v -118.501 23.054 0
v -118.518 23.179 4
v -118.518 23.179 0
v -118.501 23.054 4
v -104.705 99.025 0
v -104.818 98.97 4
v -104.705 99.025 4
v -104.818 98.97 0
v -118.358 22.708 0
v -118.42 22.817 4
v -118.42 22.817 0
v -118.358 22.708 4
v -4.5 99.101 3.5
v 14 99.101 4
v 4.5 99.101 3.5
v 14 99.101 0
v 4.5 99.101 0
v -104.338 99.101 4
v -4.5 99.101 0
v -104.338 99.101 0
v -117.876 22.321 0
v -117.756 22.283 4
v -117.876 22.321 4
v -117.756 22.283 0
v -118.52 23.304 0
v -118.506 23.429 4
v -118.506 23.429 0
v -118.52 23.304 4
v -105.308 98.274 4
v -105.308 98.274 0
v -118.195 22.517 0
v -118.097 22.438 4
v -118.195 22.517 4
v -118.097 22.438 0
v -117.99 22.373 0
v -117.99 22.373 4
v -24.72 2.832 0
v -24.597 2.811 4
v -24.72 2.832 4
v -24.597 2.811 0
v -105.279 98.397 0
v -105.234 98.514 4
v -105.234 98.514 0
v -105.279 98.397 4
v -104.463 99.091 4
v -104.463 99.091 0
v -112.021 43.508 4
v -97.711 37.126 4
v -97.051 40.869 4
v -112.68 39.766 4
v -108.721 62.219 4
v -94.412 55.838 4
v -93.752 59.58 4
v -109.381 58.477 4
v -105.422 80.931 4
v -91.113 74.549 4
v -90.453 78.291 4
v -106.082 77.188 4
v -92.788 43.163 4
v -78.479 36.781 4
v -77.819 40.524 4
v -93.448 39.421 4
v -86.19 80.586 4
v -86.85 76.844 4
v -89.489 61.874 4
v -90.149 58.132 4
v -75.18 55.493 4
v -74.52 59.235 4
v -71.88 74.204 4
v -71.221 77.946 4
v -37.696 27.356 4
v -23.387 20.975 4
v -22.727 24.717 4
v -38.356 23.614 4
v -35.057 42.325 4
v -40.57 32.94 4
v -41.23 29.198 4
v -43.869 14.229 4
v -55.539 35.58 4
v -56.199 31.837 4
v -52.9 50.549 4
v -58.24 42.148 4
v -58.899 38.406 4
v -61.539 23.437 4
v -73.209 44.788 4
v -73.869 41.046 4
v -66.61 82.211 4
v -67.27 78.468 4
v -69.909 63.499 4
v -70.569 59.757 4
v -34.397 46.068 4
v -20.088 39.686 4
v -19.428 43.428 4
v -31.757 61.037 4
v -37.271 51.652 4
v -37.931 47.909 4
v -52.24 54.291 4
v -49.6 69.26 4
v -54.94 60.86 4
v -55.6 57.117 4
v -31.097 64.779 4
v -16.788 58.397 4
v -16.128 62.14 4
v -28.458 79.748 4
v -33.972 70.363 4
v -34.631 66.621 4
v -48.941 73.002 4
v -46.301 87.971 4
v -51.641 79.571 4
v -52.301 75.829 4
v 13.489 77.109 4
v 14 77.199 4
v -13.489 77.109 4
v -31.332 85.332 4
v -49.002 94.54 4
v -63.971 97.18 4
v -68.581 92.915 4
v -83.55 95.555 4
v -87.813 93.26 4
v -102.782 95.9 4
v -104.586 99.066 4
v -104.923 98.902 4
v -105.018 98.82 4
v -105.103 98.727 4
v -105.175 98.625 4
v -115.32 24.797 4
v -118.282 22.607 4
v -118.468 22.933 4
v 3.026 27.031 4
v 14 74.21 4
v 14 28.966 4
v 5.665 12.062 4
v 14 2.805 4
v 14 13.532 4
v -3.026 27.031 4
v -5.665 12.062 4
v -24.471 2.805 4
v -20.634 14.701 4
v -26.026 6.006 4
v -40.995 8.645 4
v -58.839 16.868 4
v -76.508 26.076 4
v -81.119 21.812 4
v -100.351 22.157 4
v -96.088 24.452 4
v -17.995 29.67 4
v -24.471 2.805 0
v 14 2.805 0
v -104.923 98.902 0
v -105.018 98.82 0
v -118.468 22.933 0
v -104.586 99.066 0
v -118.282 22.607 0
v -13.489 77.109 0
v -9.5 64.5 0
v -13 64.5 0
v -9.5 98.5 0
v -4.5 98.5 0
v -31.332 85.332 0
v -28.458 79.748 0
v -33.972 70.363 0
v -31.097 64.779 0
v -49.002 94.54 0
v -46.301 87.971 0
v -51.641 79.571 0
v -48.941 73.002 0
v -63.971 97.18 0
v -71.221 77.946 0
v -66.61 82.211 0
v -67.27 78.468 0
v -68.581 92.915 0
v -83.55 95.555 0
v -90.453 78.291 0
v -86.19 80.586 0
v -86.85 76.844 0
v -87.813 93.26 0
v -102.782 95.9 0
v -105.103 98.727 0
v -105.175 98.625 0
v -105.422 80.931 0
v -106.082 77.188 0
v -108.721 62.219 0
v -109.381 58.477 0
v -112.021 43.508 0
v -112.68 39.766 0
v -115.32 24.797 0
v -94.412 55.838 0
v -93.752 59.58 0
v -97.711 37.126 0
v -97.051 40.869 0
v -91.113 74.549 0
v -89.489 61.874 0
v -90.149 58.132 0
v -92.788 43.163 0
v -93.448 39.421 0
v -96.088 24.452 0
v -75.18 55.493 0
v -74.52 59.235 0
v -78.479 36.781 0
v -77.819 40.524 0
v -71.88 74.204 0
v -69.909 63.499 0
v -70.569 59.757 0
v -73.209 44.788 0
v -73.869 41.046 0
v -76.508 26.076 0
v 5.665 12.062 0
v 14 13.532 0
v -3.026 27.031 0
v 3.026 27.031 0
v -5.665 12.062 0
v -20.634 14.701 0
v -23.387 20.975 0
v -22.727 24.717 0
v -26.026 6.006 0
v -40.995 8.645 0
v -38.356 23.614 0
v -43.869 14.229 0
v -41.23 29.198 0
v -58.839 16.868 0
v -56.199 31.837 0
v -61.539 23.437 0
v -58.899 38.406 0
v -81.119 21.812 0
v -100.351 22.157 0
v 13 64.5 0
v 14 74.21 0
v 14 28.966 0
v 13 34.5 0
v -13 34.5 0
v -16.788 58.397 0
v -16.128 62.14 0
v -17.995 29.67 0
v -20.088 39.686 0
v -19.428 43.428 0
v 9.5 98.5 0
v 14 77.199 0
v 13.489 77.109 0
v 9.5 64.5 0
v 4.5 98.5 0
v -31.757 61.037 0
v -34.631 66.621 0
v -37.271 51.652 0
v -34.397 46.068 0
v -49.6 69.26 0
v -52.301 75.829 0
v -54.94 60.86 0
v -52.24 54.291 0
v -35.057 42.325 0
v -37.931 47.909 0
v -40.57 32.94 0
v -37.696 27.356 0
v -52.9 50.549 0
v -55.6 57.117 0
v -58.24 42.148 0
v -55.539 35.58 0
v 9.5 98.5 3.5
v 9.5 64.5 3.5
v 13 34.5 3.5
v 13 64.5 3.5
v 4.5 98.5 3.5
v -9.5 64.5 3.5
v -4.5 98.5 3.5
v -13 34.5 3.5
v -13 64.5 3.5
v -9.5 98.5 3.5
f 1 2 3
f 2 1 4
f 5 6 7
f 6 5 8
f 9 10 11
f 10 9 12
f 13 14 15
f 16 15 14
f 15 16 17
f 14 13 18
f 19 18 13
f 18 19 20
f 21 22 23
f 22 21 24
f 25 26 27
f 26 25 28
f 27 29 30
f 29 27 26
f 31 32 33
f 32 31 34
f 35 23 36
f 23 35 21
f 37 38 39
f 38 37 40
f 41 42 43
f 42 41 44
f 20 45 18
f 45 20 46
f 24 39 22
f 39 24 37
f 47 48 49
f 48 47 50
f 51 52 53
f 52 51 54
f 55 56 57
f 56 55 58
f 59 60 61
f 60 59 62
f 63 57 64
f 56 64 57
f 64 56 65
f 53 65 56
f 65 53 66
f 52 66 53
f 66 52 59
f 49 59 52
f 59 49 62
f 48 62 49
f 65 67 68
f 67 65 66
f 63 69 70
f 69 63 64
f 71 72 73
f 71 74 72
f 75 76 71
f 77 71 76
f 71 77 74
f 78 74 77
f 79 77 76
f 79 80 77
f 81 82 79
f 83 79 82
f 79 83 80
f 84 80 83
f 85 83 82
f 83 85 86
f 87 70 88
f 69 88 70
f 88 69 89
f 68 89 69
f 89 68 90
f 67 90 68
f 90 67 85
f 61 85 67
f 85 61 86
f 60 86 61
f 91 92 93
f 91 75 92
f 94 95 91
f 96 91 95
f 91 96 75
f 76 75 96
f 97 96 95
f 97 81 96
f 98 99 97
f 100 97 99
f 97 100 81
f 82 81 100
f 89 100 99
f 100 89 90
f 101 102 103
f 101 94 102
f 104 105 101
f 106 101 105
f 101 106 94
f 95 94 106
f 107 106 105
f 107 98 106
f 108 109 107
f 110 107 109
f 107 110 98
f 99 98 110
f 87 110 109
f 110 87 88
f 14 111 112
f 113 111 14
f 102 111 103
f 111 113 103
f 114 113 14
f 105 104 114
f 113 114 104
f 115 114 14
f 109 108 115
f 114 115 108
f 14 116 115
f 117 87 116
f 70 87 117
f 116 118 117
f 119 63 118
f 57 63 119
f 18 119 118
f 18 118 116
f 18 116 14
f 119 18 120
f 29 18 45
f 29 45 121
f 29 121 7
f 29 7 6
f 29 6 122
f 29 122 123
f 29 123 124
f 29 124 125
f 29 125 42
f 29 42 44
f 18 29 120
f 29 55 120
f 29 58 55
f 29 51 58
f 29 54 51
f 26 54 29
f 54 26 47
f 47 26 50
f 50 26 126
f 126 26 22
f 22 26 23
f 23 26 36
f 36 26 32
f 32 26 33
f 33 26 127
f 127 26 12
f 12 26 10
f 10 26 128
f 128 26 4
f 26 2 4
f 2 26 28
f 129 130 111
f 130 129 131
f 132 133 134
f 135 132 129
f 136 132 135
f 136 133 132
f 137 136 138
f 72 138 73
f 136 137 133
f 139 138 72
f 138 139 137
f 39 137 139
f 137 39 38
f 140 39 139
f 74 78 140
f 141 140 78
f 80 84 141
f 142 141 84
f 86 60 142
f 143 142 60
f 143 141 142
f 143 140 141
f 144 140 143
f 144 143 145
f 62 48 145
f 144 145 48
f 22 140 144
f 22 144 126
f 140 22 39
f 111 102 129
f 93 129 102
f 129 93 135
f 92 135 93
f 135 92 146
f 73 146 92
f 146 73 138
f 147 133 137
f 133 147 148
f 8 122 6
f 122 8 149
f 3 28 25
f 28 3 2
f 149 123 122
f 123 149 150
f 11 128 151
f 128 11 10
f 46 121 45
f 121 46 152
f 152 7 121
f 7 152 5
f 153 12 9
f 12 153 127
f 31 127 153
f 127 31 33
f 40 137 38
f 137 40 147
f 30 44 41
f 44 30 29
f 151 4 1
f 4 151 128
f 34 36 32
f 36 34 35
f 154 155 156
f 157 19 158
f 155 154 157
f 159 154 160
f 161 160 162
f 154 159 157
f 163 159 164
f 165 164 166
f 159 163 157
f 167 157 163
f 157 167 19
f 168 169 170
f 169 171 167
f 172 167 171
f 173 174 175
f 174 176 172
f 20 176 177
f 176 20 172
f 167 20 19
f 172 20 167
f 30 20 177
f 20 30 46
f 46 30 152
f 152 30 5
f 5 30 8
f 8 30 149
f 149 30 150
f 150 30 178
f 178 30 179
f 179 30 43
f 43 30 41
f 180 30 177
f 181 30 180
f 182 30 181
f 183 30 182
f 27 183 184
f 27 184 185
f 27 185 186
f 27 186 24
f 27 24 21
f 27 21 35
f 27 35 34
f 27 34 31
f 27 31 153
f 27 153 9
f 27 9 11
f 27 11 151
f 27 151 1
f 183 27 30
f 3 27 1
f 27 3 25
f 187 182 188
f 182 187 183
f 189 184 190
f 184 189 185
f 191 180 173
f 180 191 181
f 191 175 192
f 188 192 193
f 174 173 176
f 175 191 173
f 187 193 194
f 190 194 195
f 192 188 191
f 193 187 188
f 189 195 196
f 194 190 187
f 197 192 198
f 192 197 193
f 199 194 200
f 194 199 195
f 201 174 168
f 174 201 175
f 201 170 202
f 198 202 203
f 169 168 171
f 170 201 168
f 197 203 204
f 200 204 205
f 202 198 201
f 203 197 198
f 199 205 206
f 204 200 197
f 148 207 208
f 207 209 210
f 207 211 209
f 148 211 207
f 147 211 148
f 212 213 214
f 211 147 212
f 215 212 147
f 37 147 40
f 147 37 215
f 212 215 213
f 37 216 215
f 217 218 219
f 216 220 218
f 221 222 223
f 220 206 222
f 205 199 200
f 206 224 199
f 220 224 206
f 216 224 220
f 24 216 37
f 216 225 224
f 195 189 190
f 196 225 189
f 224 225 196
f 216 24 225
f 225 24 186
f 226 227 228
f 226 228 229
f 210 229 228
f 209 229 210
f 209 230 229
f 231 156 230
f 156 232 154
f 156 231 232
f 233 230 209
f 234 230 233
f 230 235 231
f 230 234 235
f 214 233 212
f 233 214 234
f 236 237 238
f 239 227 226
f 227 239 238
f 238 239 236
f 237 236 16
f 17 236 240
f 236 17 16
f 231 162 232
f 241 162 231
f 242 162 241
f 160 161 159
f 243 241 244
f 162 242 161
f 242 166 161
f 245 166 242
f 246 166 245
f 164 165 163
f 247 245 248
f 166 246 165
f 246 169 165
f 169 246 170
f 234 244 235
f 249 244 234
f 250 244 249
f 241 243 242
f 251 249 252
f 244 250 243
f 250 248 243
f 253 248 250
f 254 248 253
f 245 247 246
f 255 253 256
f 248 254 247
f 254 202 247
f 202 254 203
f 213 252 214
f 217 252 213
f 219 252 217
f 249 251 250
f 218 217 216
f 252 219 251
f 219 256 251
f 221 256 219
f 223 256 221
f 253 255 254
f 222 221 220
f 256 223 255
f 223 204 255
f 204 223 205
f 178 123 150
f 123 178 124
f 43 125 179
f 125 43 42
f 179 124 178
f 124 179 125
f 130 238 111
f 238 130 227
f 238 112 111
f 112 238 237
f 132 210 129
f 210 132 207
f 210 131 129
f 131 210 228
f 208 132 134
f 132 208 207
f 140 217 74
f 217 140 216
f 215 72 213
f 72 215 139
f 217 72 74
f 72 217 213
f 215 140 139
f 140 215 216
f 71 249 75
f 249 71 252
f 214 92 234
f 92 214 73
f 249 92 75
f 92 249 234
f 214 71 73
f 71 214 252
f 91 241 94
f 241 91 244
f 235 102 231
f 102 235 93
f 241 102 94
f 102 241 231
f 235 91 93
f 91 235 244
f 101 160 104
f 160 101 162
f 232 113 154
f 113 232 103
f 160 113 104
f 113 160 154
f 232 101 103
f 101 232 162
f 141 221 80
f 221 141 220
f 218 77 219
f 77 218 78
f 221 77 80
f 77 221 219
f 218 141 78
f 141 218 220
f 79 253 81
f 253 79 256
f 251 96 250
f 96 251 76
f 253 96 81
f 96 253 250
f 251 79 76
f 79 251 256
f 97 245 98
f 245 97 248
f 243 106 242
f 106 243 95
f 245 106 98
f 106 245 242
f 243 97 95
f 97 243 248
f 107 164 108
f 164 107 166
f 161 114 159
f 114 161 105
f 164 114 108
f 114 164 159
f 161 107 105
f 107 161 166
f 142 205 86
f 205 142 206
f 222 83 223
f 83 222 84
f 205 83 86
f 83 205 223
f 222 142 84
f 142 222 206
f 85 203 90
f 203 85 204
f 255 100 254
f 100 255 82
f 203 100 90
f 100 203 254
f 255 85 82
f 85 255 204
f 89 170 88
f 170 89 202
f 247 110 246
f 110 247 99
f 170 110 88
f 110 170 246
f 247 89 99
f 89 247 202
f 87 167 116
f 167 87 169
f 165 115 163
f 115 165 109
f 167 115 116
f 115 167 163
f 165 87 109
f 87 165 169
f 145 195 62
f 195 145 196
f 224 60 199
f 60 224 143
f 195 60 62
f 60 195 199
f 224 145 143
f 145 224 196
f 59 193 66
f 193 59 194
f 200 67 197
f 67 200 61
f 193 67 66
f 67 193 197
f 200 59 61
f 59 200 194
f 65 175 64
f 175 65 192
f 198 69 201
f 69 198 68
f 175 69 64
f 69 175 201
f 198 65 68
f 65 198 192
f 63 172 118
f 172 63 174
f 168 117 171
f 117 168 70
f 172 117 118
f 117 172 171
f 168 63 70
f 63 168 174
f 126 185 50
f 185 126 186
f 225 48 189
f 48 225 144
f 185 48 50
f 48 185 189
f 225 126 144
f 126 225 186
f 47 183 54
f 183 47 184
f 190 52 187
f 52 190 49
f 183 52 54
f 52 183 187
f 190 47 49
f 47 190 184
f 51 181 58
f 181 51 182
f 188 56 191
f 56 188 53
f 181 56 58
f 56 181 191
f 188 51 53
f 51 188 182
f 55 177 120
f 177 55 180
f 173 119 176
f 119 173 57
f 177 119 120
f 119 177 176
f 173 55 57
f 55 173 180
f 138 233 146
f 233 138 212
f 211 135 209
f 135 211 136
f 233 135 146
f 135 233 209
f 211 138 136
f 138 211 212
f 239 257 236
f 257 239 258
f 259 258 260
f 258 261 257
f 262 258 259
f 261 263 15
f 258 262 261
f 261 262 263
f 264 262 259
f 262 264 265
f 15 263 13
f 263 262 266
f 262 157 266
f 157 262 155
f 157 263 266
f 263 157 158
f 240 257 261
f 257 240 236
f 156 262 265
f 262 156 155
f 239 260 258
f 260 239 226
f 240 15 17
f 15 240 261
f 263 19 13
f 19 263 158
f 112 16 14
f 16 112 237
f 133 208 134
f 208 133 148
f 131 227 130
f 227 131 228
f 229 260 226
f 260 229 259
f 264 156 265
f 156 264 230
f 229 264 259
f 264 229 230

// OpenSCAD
// -*- mode: c -*-
/* All distances are in mm. */

/* set output quality */
$fn = 50;

/* Distance between key centers. */
column_spacing   = 19;
row_spacing      = column_spacing;

/* This number should exceed row_spacing and column_spacing. The
 default gives a 1mm = (20mm - 19mm) gap between keycaps and cuts in
 the top plate.*/
key_hole_size = 20;

/* rotation angle; the angle between the halves is twice this
   number */
angle = 10;

/* The radius of screw holes. Holes will be slightly bigger due
   to the cut width. */
screw_hole_radius = 0;// 1.5;
/* Each screw hole is a hole in a "washer". How big these "washers"
   should be depends on the material used: this parameter and the
   `switch_hole_size` determine the spacer wall thickness. */
//washer_radius     = 4 * screw_hole_radius;
washer_radius = 1;

/* This constant allows tweaking the location of the screw holes near
   the USB cable. Only useful with small `angle` values. Try the value
   of 10 with angle=0. */
back_screw_hole_offset = 0;

/* Distance between halves. */
hand_separation        = 0;

/* The approximate size of switch holes. Used to determine how
   thick walls can be, i.e. how much room around each switch hole to
   leave. See spacer(). */
switch_hole_size = 14;

/* Sets whether the case should use notched holes. As far as I can
   tell these notches are not all that useful... */
use_notched_holes = false;

/* Number of rows and columns in the matrix. You need to update
   staggering_offsets if you change n_cols. */
n_rows = 4;
n_cols = 5;

/* Number of thumb keys (per hand), try 1 or 2. */
n_thumb_keys = 1;

/* The width of the USB cable hole in the spacer. */
cable_hole_width = 12;

/* Vertical column staggering offsets. The first element should
   be zero. */
staggering_offsets = [0, 5, 11, 6, 3];

/* Whether or not to split the spacer into quarters. */
quarter_spacer = false;

/* Where the top/bottom split of a quartered spacer will be. */
spacer_quartering_offset = 60;

module rz(angle, center=undef) {
  /* Rotate children `angle` degrees around `center`. */
  translate(center) {
    rotate(angle) {
      translate(-center) {
        for (i=[0:$children-1])
          children(i);
      }
    }
  }
}

/* Compute coordinates of a point obtained by rotating p angle degrees
   around center. Used to compute locations of screw holes near the
   USB cable hole. */
function rz_fun(p, angle, center) = [cos(angle) * (p[0] - center[0]) - sin(angle) * (p[1] - center[1]) + center[0],
                                     sin(angle) * (p[0] - center[0]) + cos(angle) * (p[1] - center[1])+ center[1]];

module switch_hole(position, notches=use_notched_holes) {
  /* Cherry MX switch hole with the center at `position`. Sizes come
     from the ErgoDox design. */
  hole_size    = 15.2;
  notch_width  = 3.5001;
  notch_offset = 4.2545;
  notch_depth  = 0.8128;
  translate(position) {
    union() {
        translate([0,0,-1])
      cube([hole_size, hole_size,50], center=true);
      if (notches == true) {
        translate([0, notch_offset,-1]) {
          cube([hole_size+2*notch_depth, notch_width,50], center=true);
        }
        translate([0, -notch_offset,-1]) {
          cube([hole_size+2*notch_depth, notch_width,50], center=true);
        }
      }
    }
  }
};

module regular_key(position, size) {
  /* Create a hole for a regular key. */
  translate(position) {
    cube([size, size,50], center=true);
  }
}

module thumb_key(position, size) {
  /* Create a hole for a 1x1.5 unit thumb key. */
  translate(position) {
    scale([1, 1.5]) {
      translate(-position) {
        regular_key(position, size);
      }
    }
  }
}

module column (bottom_position, switch_holes, key_size=key_hole_size) {
  /* Create a column of keys. */
  translate(bottom_position) {
    for (i = [0:(n_rows-1)]) {
      if (switch_holes == true) {
        switch_hole([0, i*column_spacing,-1]);
      } else {
        regular_key([0, i*column_spacing,-1], key_size);
      }
    }
  }
}

module rotate_half() {
  /* Rotate the right half of the keys around the top left corner of
     the thumb key. Assumes that the thumb key is a 1x1.5 key and that
     it is shifted 0.5*column_spacing up relative to the nearest column. */
  rotation_y_offset = 1.75 * column_spacing;
  for (i=[0:$children-1]) {
    rz(angle, [hand_separation, rotation_y_offset]) {
      children(i);
    }
  }
}

module add_hand_separation() {
  /* Shift everything right to get desired hand separation. */
  for (i=[0:$children-1]) {
    translate([0.5*hand_separation, /* we get back the full separation
                                       because of mirroring */
               0]) children(i);
  }
}

module right_half (switch_holes=true, key_size=key_hole_size) {
  /* Create switch holes or key holes for the right half of the
     keyboard. Different key_sizes are used in top_plate() and
     spacer(). */
  x_offset = 0.5 * row_spacing;
  y_offset = 0.5 * column_spacing;
  thumb_key_offset = y_offset + 0.5 * column_spacing;
  rotate_half() {
    add_hand_separation() {
      for (j=[0:(n_thumb_keys-1)]) {
        if (switch_holes == true) {
          switch_hole([x_offset + j*row_spacing, thumb_key_offset,-1]);
        } else {
          thumb_key([x_offset + j*row_spacing, thumb_key_offset,-1], key_size);
        }
      }
      for (j=[0:(n_cols-1)]) {
        column([x_offset + (j+n_thumb_keys)*row_spacing, y_offset + staggering_offsets[j]], switch_holes, key_size);
      }
    }
  }
}

module screw_hole(radius, offset_radius, position, direction) {
  /* Create a screw hole of radius `radius` at a location
     `offset_radius` from `position`, (diagonally), in the direction
     `direction`. Oh, what a mess this is. */
  /* direction is the 2-element vector specifying to which side of
     position to move to, [-1, -1] for bottom left, etc. */

  /* radius_offset is the offset in the x (or y) direction so that
     we're offset_radius from position */
  radius_offset = offset_radius / sqrt(2);
  /* key_hole_offset if the difference between key spacing and key
     hole edge */
  key_hole_offset = 0.5*(row_spacing - key_hole_size);
  x = position[0] + (radius_offset - key_hole_offset) * direction[0];
  y = position[1] + (radius_offset - key_hole_offset) * direction[1];
  translate([x,y,0]) {
    cylinder(r1=radius,r2=radius,h=4);
  }
}

module right_screw_holes(hole_radius) {
  /* coordinates of the back right screw hole before rotation... */
  back_right = [(n_cols+n_thumb_keys)*row_spacing,
               staggering_offsets[n_cols-1] + n_rows * column_spacing];
  /* and after */
  tmp = rz_fun(back_right, angle, [0, 2.25*column_spacing]);

  nudge = 0;

  rotate_half() {
    add_hand_separation() {
      screw_hole(hole_radius, washer_radius,
                 [row_spacing, 0],
                 [-nudge, -nudge]);
      screw_hole(hole_radius, washer_radius,
                 [(n_cols+n_thumb_keys)*row_spacing, staggering_offsets[n_cols-1]],
                 [nudge, -nudge]);
      #screw_hole(hole_radius, washer_radius,
                 back_right,
                 [nudge, nudge]);
    }
  }

  /* add the screw hole near the cable hole */
  *translate([washer_radius - tmp[0],
             back_screw_hole_offset]) {
    rotate_half() {
      add_hand_separation() {
        screw_hole(hole_radius,
                   washer_radius,
                   back_right,
                   [nudge, nudge]);
      }
    }
  }
}

module screw_holes(hole_radius) {
  /* Create all the screw holes. */
  right_screw_holes(hole_radius);
  mirror ([1,0,0]) { right_screw_holes(hole_radius); }
}

module left_half(switch_holes=true, key_size=key_hole_size) {
  mirror ([1,0,0]) { right_half(switch_holes, key_size); }
}

module bottom_plate() {
  /* bottom layer of the case */
  difference() {
    hull() { screw_holes(washer_radius); }
    screw_holes(screw_hole_radius);
  }
}

module top_plate() {
  /* top layer of the case */
  difference() {
    bottom_plate();
    right_half(false);
    left_half(false);
  }
}

module switch_plate() {
  /* the switch plate */
  difference() {
    bottom_plate();
    right_half();
    left_half();
  }
}

module spacer() {
  /* Create a spacer. */
  difference() {
    union() {
      difference() {
        bottom_plate();
        hull() {
          right_half(switch_holes=false, key_size=switch_hole_size + 3);
          left_half(switch_holes=false, key_size=switch_hole_size + 3);
        }
    /* add the USB cable hole: */
    translate([-0.5*cable_hole_width, 2*column_spacing,0]) {
      cube([cable_hole_width, (2*n_rows) * column_spacing,50]);
    }
      }
      screw_holes(washer_radius);
    }
    screw_holes(screw_hole_radius);
  }
}

module spacer_quadrant(spacer_quadrant_number) {
  /* Cut a quarter of a spacer. */
  translate([0, spacer_quartering_offset]) {
    intersection() {
      translate([0, -spacer_quartering_offset]) { spacer(); }
      rotate([0, 0, spacer_quadrant_number * 90]) { cube([1000, 1000,3]); }
    }
  }
}

module pcb_cutout() {
    pcb_width = 19;
    pcb_length = 34;
    pcb_height = 3.5;
    
    back_right = [(n_cols+n_thumb_keys)*row_spacing,
               staggering_offsets[n_cols-1] + n_rows * column_spacing];
    
    translate([-pcb_width/2, staggering_offsets[n_cols-1] + n_rows * column_spacing - 14.5 , 0])
    cube([pcb_width, pcb_length, pcb_height]);
    translate([-4.5,staggering_offsets[n_cols-1] + n_rows * column_spacing,0])
    #cube([9, 100, pcb_height]);
}

module battery_cutout(){
    battery_width = 26; //We have 13 mm to both sides, battery will not be 26 mm width
    
    translate([-battery_width/2, staggering_offsets[n_cols-1] + n_rows * column_spacing - 14.5 - 30, 0])
    cube([battery_width, 30, 3.5]);
}

module quartered_spacer()
{
  /* Assemble all four quarters of a spacer. */
  spacer_quadrant(0);
  spacer_quadrant(1);
  translate([-5,-10]) spacer_quadrant(2);
  translate([5,-10]) spacer_quadrant(3);
}

/* Create all four layers. */

*translate([0,0,9]) top_plate();



difference(){
    translate([0, 0, 0]) { switch_plate(); }
    translate([14, 0, 0])
cube([150,100,5]);
    pcb_cutout();
battery_cutout();
}
*translate([300, 0,0]) { bottom_plate(); }
*translate([0,0,3]) spacer();
*translate([0, 0,0]) {
  if (quarter_spacer == true) {
    quartered_spacer();
  }
  else {
    spacer();
  }

}
